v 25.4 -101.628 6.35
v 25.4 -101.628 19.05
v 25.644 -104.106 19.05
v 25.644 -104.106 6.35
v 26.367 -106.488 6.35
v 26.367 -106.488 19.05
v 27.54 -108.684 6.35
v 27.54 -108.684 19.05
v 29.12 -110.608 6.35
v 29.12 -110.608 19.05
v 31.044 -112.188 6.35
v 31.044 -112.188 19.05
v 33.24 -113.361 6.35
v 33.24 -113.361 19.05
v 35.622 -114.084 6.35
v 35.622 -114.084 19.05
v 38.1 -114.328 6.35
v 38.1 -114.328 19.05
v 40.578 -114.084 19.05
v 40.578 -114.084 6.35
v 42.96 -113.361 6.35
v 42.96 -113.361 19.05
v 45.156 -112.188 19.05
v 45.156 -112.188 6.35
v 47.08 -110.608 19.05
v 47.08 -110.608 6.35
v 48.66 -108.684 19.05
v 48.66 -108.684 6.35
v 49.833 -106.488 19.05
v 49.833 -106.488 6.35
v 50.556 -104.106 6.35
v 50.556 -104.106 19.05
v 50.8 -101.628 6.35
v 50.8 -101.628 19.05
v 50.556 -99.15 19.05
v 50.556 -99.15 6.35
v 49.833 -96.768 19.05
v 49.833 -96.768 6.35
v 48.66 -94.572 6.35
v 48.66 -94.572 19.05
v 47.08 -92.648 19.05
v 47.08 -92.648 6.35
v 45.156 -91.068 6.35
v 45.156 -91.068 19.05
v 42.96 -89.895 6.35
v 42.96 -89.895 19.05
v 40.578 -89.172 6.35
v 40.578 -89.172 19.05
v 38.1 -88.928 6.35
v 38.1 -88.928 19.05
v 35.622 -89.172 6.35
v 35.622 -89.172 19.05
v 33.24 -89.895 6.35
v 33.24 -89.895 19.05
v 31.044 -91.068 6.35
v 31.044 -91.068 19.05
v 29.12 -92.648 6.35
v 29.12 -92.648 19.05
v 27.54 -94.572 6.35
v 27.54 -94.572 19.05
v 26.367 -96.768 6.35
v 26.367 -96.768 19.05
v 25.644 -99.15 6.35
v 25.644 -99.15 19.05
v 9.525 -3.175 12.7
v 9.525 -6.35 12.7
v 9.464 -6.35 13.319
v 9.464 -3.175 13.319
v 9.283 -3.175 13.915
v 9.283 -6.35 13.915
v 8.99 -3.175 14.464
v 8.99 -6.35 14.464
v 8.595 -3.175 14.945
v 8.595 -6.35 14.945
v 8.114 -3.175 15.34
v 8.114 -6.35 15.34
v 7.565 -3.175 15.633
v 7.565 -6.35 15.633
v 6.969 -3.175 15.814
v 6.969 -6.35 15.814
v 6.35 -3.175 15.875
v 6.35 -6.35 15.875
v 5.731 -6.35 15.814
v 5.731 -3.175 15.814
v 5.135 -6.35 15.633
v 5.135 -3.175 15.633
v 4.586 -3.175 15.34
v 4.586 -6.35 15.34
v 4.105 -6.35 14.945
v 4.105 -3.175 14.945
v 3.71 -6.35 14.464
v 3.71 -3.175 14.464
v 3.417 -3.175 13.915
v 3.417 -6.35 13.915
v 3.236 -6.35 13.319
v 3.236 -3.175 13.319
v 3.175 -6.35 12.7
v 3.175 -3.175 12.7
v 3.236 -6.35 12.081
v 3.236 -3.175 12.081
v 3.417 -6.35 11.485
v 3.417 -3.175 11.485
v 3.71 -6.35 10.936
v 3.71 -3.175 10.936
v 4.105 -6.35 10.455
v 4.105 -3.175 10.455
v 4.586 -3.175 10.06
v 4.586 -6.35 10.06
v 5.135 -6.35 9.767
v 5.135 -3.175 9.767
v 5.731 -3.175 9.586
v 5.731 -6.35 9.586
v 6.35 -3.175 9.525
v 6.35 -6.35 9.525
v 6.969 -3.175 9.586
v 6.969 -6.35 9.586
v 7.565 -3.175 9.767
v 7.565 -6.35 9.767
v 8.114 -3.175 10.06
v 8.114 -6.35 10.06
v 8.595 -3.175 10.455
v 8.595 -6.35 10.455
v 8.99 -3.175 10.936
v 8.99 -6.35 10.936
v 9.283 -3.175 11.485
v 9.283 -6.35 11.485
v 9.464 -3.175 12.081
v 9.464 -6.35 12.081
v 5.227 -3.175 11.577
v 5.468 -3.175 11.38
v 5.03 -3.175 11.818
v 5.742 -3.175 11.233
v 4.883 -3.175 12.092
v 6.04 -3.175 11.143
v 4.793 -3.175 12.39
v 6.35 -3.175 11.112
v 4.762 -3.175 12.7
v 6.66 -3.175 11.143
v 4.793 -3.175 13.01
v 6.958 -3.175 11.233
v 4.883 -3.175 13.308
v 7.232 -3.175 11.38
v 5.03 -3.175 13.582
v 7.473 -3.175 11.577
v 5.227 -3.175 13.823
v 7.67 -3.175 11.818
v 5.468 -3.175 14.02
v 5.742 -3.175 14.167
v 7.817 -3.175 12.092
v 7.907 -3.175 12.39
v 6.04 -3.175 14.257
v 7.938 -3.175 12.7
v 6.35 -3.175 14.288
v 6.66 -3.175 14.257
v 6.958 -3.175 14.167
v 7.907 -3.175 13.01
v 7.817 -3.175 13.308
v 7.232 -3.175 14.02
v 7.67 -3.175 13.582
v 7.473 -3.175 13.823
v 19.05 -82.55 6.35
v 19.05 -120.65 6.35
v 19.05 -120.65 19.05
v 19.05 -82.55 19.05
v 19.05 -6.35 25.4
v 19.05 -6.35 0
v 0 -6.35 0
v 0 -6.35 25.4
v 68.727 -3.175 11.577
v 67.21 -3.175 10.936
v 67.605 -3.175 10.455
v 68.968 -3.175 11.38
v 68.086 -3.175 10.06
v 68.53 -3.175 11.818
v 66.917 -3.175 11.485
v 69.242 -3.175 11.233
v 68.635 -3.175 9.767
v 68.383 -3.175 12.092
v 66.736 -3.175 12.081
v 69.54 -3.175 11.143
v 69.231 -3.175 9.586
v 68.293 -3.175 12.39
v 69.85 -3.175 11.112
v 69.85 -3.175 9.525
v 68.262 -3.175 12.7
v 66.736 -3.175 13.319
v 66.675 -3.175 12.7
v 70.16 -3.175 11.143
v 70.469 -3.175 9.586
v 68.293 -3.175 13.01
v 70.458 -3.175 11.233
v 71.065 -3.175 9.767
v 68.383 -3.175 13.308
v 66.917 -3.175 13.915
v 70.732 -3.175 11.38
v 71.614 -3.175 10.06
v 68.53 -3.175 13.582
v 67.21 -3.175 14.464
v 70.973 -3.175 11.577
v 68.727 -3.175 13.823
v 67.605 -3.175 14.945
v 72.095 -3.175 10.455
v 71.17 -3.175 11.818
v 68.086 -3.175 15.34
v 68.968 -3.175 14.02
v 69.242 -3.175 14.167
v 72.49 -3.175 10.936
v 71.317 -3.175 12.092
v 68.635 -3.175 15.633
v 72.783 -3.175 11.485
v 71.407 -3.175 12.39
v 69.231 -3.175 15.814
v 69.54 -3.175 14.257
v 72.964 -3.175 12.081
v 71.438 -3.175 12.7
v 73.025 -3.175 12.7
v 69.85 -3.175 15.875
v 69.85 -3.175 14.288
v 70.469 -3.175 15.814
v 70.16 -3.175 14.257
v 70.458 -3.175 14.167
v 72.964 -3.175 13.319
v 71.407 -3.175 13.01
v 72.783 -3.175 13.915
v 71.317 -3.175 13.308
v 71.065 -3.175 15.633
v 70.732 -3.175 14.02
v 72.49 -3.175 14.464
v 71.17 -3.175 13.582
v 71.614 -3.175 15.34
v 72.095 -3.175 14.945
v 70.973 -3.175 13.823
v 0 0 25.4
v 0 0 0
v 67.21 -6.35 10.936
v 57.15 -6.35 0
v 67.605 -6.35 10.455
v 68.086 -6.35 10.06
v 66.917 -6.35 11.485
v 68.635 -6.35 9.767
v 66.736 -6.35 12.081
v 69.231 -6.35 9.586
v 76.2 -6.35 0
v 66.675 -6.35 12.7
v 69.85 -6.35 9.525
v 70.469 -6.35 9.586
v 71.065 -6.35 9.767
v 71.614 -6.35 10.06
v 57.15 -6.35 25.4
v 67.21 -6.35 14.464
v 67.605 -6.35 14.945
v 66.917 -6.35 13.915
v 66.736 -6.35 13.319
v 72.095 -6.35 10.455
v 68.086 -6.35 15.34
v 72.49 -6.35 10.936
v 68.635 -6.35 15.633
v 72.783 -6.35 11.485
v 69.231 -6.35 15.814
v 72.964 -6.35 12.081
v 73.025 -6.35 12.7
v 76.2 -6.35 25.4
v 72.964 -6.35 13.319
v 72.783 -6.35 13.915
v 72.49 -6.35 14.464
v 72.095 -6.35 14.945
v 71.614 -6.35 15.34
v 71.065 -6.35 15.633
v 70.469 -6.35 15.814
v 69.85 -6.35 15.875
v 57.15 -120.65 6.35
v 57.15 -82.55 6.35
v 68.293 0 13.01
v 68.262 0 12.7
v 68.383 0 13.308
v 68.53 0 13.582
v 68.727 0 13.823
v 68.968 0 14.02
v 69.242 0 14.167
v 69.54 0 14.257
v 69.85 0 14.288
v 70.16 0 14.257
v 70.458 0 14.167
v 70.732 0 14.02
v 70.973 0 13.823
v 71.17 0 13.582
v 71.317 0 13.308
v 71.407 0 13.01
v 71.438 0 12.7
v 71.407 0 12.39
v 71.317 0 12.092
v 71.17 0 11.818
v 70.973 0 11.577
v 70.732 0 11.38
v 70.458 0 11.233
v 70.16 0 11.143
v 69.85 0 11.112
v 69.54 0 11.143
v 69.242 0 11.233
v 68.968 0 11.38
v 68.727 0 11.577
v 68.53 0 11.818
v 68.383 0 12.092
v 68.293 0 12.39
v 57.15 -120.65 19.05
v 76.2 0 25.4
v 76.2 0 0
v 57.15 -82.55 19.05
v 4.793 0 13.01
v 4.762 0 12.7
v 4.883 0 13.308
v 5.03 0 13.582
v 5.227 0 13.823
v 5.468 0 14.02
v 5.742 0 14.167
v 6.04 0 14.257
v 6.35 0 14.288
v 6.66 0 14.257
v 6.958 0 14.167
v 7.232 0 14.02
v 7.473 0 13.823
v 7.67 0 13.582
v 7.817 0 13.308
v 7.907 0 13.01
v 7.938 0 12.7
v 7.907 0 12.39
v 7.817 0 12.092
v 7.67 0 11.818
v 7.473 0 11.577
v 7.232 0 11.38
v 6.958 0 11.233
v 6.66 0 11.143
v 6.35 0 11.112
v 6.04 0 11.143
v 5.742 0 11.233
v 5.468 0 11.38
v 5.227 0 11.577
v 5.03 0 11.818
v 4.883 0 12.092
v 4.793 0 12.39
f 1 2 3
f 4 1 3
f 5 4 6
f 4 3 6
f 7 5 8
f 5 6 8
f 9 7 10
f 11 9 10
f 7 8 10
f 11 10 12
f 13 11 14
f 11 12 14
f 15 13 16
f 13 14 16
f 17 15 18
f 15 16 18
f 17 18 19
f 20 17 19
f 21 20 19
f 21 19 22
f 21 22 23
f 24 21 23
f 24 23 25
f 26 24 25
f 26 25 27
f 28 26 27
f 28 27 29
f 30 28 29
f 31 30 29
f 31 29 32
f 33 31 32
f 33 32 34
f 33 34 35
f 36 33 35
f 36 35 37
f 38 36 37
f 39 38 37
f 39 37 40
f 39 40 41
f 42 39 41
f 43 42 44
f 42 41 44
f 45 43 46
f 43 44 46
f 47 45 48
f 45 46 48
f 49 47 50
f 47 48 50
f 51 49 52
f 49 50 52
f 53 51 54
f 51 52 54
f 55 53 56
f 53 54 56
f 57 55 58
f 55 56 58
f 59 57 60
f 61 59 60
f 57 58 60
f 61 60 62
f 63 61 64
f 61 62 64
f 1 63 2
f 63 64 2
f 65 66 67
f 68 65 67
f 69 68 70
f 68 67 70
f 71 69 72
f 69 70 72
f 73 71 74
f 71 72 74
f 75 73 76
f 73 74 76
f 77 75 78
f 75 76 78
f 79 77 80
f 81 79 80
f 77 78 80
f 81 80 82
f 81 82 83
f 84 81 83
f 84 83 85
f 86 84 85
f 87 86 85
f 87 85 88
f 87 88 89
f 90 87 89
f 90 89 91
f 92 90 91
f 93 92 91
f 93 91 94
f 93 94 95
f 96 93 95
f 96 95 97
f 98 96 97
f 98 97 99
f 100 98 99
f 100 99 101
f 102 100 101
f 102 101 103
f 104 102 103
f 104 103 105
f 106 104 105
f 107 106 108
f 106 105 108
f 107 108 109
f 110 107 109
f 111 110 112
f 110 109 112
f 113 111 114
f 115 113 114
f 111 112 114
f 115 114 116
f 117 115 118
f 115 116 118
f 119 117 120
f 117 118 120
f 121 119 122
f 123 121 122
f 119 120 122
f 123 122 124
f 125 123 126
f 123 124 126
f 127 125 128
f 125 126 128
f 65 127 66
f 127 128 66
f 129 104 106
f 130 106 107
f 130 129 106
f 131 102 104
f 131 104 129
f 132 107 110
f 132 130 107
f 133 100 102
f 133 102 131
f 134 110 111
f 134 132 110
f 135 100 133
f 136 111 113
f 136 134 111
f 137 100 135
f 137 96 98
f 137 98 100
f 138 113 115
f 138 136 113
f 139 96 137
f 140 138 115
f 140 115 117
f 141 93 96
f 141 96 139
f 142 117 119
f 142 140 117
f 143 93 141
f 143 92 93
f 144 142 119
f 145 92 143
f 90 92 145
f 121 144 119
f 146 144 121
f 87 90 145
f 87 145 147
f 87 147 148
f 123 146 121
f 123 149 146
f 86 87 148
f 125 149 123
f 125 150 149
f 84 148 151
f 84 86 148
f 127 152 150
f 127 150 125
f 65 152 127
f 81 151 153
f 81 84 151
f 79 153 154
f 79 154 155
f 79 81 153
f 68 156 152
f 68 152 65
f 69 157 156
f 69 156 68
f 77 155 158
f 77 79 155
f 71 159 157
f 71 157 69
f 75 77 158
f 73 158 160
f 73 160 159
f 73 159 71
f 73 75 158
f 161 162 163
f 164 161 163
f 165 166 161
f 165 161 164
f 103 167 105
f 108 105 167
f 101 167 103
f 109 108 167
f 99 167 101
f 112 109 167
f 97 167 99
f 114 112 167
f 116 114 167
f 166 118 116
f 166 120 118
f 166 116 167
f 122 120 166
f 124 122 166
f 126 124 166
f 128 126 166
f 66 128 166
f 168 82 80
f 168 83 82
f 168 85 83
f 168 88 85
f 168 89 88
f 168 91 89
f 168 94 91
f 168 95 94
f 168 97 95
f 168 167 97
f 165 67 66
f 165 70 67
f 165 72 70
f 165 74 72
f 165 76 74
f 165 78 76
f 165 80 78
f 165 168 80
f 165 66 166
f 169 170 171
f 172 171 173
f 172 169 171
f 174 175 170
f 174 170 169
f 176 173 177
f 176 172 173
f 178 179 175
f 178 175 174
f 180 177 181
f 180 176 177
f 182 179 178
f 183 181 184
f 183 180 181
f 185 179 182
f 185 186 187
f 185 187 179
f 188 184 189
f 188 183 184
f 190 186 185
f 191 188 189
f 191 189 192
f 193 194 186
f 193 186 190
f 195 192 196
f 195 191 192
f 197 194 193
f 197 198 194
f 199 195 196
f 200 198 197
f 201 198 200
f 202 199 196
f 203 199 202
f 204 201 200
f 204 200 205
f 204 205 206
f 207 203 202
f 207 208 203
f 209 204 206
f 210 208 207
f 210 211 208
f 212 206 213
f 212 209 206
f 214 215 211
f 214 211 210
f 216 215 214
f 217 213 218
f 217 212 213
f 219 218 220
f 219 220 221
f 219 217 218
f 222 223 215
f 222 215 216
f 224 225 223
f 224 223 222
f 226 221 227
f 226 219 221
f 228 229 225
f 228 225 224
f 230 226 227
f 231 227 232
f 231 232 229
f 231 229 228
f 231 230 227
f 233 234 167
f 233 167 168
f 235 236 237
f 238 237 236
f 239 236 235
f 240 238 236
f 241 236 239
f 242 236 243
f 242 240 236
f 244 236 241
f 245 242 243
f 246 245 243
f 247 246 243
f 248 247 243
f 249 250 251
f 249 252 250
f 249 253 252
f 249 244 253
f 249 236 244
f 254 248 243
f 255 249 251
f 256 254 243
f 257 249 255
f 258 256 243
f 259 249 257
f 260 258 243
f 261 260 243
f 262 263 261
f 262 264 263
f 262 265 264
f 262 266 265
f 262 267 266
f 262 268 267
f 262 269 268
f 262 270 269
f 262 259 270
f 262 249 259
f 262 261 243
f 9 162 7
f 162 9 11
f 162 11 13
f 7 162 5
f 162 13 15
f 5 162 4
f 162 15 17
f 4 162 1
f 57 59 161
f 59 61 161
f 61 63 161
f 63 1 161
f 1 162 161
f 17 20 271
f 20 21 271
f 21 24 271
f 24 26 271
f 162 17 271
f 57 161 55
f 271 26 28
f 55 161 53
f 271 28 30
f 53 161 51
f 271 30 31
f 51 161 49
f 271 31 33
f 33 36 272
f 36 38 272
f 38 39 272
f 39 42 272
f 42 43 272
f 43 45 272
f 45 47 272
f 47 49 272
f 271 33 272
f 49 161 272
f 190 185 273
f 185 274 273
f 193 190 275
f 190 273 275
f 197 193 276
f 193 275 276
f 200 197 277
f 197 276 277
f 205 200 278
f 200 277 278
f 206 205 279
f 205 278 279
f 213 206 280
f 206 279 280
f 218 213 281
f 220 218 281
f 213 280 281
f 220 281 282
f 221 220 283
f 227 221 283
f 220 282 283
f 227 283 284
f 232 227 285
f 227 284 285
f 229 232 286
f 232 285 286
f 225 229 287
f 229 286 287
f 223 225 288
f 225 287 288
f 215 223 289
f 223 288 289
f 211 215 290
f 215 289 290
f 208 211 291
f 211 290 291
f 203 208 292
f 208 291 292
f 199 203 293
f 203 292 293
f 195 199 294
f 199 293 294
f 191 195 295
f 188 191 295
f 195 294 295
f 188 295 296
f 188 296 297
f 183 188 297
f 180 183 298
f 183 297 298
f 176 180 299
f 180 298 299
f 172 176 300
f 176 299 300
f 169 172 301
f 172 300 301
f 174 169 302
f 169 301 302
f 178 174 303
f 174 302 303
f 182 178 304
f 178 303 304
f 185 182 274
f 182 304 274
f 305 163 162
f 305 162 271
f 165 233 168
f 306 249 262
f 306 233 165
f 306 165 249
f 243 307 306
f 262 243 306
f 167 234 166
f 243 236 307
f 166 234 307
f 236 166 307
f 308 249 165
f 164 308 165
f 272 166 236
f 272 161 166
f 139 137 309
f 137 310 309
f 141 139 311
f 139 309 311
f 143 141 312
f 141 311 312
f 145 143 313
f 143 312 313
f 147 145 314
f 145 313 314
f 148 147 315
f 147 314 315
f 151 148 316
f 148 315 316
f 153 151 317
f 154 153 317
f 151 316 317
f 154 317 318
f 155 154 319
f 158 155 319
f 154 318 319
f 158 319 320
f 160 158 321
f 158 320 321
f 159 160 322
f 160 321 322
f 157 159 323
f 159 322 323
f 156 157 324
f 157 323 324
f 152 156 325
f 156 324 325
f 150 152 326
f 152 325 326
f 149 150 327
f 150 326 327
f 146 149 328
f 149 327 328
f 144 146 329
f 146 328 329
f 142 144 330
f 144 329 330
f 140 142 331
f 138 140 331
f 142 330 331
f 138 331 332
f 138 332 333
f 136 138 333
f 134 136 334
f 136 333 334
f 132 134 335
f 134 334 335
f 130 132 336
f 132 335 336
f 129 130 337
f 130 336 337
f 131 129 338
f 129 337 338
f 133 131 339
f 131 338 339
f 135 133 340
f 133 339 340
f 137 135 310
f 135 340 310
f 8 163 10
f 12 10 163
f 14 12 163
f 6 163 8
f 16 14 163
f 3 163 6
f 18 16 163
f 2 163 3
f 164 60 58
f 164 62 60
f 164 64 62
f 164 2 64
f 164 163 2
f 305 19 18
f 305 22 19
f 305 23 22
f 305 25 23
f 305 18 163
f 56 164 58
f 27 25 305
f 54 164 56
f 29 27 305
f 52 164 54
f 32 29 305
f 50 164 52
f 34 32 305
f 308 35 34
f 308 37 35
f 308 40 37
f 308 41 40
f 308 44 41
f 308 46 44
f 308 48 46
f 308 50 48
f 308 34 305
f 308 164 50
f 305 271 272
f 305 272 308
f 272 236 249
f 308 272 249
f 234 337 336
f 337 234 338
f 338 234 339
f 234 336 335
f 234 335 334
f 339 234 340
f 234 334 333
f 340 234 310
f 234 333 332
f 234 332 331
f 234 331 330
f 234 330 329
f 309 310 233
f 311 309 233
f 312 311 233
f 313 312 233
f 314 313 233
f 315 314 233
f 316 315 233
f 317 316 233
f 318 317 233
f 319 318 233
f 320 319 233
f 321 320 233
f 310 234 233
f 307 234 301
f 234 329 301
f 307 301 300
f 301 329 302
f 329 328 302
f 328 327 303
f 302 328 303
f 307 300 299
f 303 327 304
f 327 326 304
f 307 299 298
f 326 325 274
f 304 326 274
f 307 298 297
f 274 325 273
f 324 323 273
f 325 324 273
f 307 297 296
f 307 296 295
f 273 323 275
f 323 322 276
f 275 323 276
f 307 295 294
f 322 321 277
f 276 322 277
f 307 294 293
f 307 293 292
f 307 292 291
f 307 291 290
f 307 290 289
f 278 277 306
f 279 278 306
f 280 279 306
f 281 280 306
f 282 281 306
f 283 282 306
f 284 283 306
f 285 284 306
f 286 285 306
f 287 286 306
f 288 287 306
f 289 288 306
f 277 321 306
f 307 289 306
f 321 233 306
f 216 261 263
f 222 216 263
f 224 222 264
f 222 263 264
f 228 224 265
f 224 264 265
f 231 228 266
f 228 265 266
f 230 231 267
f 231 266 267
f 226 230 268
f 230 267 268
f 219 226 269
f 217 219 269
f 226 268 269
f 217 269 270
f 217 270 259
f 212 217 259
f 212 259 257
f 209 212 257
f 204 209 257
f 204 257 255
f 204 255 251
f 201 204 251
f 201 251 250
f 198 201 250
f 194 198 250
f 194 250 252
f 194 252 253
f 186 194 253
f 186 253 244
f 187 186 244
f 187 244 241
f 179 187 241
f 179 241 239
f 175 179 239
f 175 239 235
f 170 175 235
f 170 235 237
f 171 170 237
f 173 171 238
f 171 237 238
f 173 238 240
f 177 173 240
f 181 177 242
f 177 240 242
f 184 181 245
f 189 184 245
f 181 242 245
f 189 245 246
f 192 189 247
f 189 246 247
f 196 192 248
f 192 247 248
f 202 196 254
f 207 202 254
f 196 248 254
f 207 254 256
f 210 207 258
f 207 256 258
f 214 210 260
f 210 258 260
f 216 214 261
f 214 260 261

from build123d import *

# Parameters (mm, degrees)
F0_W           = 76.2
F0_H           = 25.4
F1_DEPTH       = 6.35
F3_D           = 3.175
F3_CBORE_D     = 6.35
F3_CBORE_DEPTH = 3.175
F4_W           = 38.1
F4_H           = 25.4
F6_W           = 38.1
F6_H           = 12.7
F8_W           = 38.1
F8_H           = 12.7
F9_DEPTH       = 38.1
F11_D          = 25.4


with BuildPart() as f1:
    # F0 (on Front) → F1 (new body)
    with BuildSketch(Plane.XZ):
        with Locations((38.1, 12.7)):
            Rectangle(F0_W, F0_H)
    extrude(amount=F1_DEPTH)

    # F3 (through all)
    with Locations(Plane.XZ.offset(6.35)):
        with Locations((6.35, 12.7), (69.85, 12.7)):
            CounterBoreHole(F3_D / 2, F3_CBORE_D / 2, F3_CBORE_DEPTH)

    # F4 (on face) → F7 section 0
    with BuildSketch(Plane.XZ.offset(6.35)):
        with Locations((38.1, 12.7)):
            Rectangle(F4_W, F4_H)
    # F6 (on offset) → F7 section 1
    with BuildSketch(Plane.XZ.offset(82.55)):
        with Locations((38.1, 12.7)):
            Rectangle(F6_W, F6_H)
    loft()

    # F8 (on face) → F9 (join)
    with BuildSketch(Plane.XZ.offset(82.55)):
        with Locations((38.1, 12.7)):
            Rectangle(F8_W, F8_H)
    extrude(amount=F9_DEPTH)

    # F11 (through all)
    with Locations(Plane(origin=(0, 0, 6.35), x_dir=(1, 0, 0), z_dir=(0, 0, -1))):
        with Locations((38.1, 101.6279906034)):
            Hole(F11_D / 2)


solid = f1.part
